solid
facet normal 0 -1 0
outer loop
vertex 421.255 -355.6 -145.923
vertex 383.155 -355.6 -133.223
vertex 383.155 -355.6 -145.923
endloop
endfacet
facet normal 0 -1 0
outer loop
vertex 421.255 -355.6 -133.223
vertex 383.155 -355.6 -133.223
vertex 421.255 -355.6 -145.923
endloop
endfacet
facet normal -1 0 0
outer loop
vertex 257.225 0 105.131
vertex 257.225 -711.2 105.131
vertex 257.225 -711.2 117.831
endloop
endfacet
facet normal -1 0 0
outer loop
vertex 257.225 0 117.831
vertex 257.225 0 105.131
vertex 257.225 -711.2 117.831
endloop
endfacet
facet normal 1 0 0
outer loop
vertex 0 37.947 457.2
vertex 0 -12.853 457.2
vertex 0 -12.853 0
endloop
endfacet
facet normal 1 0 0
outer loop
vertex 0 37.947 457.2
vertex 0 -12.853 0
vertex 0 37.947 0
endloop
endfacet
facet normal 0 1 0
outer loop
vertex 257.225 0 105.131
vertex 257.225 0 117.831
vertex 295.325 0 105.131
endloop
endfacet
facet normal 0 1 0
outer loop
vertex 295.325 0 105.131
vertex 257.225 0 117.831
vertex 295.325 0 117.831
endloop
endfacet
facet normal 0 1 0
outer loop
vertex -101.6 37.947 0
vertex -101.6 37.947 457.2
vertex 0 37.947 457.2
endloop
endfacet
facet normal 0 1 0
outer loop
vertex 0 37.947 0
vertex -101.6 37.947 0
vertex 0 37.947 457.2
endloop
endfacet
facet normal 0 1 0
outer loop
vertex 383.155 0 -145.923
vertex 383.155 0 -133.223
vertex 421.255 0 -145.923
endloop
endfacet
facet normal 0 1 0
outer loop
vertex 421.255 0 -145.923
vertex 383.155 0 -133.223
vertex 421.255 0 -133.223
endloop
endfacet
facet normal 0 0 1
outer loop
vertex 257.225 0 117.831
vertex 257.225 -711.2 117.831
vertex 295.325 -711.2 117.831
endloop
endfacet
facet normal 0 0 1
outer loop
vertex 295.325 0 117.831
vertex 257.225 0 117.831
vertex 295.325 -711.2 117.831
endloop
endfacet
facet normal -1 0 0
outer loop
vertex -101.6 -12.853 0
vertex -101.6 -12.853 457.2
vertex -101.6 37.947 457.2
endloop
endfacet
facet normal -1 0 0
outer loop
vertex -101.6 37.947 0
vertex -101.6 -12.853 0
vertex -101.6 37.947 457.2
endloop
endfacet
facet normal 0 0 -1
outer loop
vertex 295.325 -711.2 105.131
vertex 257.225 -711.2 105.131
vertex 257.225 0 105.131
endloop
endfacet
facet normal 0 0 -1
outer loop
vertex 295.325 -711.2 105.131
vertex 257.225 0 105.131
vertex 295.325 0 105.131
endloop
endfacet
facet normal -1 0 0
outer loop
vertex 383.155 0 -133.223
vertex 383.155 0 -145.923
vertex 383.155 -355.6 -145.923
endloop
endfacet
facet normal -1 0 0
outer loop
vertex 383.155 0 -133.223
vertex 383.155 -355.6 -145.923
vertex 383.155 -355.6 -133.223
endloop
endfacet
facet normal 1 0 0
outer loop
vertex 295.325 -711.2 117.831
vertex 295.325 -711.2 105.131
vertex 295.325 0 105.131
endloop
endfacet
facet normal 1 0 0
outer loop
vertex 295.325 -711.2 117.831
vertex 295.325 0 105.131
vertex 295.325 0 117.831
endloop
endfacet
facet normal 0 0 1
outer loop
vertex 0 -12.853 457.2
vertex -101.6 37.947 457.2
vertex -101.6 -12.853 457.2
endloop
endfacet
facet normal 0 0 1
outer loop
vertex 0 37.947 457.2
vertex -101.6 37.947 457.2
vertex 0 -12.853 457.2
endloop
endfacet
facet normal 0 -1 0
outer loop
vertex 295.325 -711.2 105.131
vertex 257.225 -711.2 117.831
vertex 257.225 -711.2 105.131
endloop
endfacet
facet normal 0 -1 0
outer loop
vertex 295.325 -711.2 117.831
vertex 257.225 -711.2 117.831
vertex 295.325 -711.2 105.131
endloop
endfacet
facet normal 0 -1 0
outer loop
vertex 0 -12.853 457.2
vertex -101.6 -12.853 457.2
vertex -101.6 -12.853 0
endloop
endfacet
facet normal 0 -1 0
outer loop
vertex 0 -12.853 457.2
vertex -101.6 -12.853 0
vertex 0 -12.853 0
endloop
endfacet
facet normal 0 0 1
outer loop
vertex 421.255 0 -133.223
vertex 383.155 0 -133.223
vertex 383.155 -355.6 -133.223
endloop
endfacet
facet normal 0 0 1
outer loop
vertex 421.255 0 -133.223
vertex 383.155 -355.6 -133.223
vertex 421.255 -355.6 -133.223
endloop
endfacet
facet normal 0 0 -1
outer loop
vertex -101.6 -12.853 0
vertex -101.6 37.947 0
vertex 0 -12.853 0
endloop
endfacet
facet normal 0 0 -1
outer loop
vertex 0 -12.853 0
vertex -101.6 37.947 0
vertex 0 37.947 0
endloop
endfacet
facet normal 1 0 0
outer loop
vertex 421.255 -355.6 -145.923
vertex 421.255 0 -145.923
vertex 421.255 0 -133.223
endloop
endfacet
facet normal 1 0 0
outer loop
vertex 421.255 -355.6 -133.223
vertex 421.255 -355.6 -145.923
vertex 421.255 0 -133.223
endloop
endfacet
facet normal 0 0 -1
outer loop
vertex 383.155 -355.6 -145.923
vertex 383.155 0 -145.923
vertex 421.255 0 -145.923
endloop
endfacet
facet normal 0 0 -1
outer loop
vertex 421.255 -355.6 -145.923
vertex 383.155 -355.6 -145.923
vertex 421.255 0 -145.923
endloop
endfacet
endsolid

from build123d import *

# Parameters (mm, degrees)
F0_W     = 101.6
F0_H     = 50.8
F1_DEPTH = 457.2
F2_W     = 38.1
F2_H     = 12.7
F3_DEPTH = 355.6
F4_W     = 38.1
F4_H     = 12.7
F5_DEPTH = 711.2


with BuildPart() as f1:
    # F0 (on Top) → F1 (new body)
    with BuildSketch(Plane.XY):
        with Locations((-50.8, 12.547112)):
            Rectangle(F0_W, F0_H)
    extrude(amount=F1_DEPTH)


with BuildPart() as f3:
    # F2 (on Front) → F3 (new body)
    with BuildSketch(Plane.XZ):
        with Locations((402.20535, -139.572631)):
            Rectangle(F2_W, F2_H)
    extrude(amount=F3_DEPTH)


with BuildPart() as f5:
    # F4 (on Front) → F5 (new body)
    with BuildSketch(Plane.XZ):
        with Locations((276.274922, 111.481365)):
            Rectangle(F4_W, F4_H)
    extrude(amount=F5_DEPTH)


solid = Compound([f1.part, f3.part, f5.part])
